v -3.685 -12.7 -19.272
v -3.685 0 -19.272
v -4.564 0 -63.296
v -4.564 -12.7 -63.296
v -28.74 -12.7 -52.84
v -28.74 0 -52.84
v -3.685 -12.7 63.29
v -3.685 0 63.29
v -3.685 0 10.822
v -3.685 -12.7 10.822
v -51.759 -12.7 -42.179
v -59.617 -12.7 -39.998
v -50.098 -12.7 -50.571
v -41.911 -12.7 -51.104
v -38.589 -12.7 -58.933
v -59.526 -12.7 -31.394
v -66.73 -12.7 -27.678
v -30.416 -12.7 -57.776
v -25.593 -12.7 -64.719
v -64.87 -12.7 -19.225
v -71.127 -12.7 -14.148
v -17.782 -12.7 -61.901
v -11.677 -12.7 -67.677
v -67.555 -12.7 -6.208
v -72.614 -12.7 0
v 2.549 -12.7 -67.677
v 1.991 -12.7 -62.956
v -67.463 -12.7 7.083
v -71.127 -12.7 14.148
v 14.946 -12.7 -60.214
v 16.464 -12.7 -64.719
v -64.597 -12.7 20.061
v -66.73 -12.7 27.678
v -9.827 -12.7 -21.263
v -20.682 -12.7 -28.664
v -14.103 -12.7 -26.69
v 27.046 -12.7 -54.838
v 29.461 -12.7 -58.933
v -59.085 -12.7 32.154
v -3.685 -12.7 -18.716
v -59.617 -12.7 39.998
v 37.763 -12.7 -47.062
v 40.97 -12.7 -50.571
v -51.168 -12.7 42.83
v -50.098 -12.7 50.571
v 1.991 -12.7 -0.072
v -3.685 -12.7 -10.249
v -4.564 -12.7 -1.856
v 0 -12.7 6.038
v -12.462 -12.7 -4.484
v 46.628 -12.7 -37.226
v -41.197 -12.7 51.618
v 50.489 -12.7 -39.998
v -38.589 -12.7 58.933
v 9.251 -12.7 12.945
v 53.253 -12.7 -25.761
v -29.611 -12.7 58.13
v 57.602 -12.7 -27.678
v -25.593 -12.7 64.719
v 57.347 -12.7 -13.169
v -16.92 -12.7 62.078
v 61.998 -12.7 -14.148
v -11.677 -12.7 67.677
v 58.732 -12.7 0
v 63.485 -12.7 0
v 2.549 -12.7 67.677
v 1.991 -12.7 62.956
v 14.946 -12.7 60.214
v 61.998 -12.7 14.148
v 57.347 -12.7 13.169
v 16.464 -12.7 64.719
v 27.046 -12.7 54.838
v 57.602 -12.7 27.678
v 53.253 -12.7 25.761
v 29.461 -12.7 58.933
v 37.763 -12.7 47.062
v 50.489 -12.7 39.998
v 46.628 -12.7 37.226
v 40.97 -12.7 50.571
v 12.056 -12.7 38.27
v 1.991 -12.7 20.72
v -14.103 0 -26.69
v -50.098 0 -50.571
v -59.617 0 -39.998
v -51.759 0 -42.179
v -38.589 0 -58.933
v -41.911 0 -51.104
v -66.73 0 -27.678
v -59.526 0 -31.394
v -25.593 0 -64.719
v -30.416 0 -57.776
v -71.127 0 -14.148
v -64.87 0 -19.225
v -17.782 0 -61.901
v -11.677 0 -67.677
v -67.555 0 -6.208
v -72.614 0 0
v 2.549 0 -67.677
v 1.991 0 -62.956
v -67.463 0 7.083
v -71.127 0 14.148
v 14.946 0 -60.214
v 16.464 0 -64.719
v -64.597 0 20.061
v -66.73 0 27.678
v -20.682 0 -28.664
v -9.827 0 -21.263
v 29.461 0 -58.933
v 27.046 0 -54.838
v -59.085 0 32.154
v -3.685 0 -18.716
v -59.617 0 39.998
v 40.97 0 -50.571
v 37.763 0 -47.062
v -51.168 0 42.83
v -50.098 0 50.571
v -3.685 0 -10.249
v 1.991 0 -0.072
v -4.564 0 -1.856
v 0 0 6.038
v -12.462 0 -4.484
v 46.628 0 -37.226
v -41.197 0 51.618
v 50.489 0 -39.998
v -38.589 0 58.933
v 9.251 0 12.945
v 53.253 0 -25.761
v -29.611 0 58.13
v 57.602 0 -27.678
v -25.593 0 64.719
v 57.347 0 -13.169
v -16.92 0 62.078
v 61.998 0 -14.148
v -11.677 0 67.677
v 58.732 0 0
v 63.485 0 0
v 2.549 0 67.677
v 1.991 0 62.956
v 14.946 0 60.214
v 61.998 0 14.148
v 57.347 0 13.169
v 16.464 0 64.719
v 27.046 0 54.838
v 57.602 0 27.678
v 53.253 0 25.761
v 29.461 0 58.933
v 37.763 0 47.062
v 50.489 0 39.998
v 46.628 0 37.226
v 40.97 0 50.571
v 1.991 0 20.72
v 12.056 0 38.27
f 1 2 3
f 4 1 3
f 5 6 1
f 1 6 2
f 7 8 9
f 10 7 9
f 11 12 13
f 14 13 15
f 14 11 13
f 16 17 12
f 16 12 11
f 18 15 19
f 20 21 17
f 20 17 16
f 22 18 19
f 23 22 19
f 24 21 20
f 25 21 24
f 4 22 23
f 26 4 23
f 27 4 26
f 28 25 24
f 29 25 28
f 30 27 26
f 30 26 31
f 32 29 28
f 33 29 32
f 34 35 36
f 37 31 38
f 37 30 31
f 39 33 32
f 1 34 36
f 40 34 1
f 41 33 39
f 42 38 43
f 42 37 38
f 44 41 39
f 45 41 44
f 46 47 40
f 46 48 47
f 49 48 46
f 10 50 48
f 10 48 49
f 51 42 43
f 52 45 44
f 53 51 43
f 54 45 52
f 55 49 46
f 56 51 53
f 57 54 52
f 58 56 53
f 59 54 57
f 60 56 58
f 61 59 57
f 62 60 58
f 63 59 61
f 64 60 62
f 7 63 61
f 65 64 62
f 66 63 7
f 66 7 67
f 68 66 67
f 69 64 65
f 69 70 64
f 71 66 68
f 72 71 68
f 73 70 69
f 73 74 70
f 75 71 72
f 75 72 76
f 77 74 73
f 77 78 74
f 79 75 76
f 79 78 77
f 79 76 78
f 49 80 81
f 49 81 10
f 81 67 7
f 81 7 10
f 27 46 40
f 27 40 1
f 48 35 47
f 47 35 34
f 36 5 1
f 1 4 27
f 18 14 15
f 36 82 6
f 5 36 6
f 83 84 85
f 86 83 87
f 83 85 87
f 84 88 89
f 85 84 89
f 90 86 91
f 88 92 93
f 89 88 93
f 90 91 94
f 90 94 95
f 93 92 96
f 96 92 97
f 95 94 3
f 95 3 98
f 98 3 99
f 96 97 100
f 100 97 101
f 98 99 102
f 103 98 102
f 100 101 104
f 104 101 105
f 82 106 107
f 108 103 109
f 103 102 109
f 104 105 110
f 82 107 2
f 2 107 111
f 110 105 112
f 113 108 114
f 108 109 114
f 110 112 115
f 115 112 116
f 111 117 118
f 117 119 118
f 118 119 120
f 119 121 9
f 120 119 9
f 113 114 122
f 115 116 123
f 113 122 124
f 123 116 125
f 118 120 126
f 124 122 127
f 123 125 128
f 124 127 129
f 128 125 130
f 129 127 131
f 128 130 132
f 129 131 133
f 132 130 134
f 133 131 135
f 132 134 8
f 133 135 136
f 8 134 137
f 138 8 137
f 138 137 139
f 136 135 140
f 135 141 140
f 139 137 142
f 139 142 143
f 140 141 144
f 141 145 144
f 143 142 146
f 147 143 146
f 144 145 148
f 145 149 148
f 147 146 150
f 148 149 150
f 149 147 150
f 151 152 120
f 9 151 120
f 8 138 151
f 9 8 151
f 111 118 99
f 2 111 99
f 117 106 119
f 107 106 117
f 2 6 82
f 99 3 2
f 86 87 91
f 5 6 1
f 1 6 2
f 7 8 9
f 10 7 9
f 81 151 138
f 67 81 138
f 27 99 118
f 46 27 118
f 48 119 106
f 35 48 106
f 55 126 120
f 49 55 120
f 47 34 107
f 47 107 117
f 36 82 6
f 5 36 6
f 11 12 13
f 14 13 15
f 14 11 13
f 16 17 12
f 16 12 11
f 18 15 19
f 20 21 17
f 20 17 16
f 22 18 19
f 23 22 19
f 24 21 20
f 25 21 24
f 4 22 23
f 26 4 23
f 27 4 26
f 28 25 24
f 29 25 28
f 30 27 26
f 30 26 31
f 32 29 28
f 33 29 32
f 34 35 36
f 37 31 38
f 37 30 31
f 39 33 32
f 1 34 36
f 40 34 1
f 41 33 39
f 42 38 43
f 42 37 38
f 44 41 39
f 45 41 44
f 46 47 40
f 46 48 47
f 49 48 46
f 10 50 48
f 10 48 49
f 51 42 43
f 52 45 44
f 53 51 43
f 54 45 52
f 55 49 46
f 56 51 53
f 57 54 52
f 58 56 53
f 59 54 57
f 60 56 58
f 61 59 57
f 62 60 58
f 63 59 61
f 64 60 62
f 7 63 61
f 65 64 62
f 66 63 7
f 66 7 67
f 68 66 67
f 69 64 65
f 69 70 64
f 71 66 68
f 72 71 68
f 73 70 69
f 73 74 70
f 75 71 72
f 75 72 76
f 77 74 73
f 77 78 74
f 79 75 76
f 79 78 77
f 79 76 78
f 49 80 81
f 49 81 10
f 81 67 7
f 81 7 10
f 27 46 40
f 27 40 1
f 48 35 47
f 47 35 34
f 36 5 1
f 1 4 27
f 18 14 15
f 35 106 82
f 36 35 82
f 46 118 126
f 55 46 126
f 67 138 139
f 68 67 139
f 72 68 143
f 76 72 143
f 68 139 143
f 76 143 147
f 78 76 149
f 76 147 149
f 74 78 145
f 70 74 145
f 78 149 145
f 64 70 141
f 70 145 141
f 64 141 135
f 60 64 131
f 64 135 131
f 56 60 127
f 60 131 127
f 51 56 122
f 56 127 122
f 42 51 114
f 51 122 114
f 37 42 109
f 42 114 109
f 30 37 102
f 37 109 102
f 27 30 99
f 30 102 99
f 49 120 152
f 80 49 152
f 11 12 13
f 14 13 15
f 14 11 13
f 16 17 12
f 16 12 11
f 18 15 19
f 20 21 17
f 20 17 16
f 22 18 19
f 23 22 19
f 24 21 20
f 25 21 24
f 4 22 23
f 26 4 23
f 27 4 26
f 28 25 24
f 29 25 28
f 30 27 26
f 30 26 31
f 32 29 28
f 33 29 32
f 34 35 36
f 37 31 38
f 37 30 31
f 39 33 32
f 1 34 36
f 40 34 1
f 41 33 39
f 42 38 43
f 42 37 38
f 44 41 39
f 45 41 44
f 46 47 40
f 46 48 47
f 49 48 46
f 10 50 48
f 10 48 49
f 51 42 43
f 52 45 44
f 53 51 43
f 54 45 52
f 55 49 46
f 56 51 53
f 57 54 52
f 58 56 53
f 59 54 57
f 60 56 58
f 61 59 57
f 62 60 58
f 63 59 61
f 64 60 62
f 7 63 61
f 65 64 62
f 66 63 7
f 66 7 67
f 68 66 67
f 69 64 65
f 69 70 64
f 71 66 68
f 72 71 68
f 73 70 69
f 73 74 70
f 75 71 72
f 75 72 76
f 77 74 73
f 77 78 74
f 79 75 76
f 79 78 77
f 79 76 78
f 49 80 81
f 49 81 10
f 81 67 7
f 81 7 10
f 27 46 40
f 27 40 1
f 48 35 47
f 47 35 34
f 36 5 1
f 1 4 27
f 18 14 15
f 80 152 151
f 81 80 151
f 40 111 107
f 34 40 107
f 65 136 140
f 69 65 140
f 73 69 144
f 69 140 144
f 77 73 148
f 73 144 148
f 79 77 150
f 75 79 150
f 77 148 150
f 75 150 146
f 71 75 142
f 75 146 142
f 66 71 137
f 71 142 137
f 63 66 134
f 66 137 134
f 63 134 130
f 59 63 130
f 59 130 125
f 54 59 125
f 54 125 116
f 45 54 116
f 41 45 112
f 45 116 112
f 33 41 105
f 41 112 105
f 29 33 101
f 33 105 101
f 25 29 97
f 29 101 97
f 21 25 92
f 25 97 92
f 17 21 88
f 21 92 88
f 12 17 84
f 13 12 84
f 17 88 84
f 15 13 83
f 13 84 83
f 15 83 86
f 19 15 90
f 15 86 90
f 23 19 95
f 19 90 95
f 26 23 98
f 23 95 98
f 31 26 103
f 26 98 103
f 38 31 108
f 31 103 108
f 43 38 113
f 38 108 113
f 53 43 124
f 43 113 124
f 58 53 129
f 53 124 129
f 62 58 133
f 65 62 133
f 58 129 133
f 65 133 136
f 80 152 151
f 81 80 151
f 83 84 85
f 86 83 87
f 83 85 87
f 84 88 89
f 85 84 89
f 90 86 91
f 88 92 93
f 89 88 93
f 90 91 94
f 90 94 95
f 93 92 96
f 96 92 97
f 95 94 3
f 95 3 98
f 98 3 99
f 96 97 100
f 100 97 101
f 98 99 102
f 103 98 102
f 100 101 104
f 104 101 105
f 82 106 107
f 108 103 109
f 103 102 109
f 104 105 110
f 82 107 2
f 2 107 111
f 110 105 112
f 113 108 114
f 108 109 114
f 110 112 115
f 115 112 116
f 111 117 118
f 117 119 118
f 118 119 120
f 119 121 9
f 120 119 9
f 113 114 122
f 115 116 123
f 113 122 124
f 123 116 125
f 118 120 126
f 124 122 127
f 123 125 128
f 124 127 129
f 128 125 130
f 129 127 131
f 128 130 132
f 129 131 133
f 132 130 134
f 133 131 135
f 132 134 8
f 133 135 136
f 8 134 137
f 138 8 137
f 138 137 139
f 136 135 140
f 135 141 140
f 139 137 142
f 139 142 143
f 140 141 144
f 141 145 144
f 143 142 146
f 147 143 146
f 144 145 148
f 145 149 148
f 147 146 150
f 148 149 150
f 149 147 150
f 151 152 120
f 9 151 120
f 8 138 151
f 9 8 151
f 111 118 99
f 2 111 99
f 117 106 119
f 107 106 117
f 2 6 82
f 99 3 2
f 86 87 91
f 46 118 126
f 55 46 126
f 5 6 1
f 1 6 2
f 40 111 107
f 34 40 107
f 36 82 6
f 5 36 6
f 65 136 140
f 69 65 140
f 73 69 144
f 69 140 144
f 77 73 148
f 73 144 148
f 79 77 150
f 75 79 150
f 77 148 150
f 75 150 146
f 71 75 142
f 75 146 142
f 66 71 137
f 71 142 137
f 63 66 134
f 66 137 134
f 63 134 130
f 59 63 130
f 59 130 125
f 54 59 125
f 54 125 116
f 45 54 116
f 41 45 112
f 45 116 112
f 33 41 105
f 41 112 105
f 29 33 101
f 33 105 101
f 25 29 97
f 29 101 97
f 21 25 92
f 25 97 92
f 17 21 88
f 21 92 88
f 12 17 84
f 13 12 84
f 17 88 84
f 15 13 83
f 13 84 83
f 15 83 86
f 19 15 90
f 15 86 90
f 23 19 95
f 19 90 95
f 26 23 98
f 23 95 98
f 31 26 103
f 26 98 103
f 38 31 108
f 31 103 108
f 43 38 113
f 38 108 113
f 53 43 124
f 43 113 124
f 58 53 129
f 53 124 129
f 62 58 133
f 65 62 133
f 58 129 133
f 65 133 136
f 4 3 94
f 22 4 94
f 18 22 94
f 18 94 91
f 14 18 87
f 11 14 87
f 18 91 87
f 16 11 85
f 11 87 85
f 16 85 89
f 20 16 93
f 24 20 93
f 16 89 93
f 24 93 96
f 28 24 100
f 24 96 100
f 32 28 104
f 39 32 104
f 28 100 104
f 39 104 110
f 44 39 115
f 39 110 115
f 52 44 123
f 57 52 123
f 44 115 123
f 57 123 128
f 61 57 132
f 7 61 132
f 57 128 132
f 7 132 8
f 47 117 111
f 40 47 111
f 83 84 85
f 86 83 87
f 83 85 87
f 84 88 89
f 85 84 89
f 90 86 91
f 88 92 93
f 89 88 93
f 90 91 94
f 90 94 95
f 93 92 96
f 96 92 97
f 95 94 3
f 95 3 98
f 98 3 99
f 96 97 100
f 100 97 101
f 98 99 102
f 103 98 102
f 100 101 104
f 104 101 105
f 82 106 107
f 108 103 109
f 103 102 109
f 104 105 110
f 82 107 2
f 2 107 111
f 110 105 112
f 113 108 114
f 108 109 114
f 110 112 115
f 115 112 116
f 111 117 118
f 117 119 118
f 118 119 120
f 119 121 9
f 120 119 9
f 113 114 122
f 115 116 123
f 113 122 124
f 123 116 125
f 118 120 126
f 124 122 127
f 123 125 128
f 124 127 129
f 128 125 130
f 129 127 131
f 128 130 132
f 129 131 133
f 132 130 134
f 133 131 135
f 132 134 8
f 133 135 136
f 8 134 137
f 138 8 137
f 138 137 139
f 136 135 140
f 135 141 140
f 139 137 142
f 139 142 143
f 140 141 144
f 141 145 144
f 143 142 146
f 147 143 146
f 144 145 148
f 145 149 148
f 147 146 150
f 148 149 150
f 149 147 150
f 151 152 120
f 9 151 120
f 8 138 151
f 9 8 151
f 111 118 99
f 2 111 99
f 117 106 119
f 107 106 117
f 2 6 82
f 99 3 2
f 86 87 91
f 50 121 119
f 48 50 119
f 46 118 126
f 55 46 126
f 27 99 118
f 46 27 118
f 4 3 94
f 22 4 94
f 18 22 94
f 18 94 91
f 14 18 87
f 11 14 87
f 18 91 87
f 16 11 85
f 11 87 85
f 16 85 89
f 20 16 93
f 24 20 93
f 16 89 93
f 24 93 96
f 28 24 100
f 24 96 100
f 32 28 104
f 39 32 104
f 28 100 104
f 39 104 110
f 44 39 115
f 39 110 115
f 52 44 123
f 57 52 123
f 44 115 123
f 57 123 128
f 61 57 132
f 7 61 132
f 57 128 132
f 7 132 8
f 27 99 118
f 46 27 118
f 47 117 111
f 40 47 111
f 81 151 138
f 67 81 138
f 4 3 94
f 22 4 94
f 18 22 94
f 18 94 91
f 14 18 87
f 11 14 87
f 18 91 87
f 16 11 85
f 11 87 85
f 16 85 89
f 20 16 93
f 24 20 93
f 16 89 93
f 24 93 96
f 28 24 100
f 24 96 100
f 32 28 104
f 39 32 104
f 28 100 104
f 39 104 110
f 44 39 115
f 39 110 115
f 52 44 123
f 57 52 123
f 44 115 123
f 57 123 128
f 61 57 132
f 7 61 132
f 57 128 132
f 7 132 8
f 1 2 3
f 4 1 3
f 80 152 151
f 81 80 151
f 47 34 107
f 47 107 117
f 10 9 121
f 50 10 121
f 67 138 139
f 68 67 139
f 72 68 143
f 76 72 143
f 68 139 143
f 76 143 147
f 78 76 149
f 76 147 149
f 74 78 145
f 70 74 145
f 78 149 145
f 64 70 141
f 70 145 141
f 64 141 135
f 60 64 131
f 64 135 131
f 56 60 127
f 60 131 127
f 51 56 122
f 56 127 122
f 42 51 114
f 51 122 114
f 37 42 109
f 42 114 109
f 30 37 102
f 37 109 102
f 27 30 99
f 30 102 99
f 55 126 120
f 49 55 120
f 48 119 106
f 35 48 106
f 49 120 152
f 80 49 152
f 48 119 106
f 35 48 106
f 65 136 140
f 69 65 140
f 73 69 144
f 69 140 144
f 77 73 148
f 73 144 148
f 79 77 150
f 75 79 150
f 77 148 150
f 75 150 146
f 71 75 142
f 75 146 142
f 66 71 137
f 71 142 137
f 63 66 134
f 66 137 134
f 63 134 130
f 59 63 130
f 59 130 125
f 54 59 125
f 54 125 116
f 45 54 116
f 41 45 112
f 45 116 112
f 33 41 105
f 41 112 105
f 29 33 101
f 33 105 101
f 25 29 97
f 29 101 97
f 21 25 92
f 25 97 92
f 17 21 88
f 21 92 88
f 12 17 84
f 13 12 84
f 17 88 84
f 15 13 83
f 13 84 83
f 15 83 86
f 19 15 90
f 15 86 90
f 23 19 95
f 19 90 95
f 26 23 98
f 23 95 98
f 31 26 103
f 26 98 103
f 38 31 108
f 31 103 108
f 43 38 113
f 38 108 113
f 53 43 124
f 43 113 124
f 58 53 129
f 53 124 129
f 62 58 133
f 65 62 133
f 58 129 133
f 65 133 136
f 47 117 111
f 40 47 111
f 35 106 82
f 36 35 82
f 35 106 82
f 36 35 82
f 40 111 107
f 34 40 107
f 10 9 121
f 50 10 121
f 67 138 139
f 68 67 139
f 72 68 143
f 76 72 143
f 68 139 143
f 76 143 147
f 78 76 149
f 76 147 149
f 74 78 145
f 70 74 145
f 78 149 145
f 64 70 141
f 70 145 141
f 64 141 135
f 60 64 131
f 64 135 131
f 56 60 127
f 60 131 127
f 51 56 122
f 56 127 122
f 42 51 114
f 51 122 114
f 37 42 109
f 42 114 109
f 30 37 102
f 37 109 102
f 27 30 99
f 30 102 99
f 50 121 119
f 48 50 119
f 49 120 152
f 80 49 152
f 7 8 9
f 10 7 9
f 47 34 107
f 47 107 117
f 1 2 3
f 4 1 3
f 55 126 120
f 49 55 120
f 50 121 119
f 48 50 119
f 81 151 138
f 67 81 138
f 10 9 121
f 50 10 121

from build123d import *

# Parameters (mm, degrees)
F0_R     = 68.049486
F1_DEPTH = 12.7
F2_DEPTH = 12.7
F3_DEPTH = 12.7


with BuildPart() as f1:
    # F0 (on Front) → F1 (new body)
    with BuildSketch(Plane.XZ):
        with Locations((-4.564174, 0)):
            Circle(F0_R)
        with BuildLine():
            Line((-3.684707, 10.822025), (-12.461956, -4.483647))
            Line((-12.461956, -4.483647), (-4.564174, -1.85643))
            Line((-4.564174, -1.85643), (-20.681644, -28.66406))
            Line((-20.681644, -28.66406), (-14.103085, -26.690492))
            Line((-14.103085, -26.690492), (-28.74038, -52.840266))
            Line((-28.74038, -52.840266), (-3.684707, -19.27209))
            Line((-3.684707, -19.27209), (-4.564174, -63.296126))
            ThreePointArc((-4.564174, -63.296126), (-67.858772, 0.439744), (-3.684707, 63.290016))
            Line((-3.684707, 63.290016), (-3.684707, 10.822025))
        make_face(mode=Mode.SUBTRACT)
        Polygon((-3.684707, -10.249377), (-3.684707, -18.716367), (-9.827021, -21.26318), align=None, mode=Mode.SUBTRACT)
        with BuildLine():
            Line((0, 6.037842), (12.05563, 38.269857))
            Line((12.05563, 38.269857), (1.991368, 20.719905))
            Line((1.991368, 20.719905), (1.991368, 62.955734))
            ThreePointArc((1.991368, 62.955734), (58.731952, 0), (1.991368, -62.955734))
            Line((1.991368, -62.955734), (1.991368, -0.071586))
            Line((1.991368, -0.071586), (9.250801, 12.945329))
            Line((9.250801, 12.945329), (0, 6.037842))
        make_face(mode=Mode.SUBTRACT)
    extrude(amount=F1_DEPTH)


with BuildPart() as f2:
    # F0 (on Front) → F2 (new body)
    with BuildSketch(Plane.XZ):
        with Locations((-4.564174, 0)):
            Circle(F0_R)
        with BuildLine():
            Line((-3.684707, 10.822025), (-12.461956, -4.483647))
            Line((-12.461956, -4.483647), (-4.564174, -1.85643))
            Line((-4.564174, -1.85643), (-20.681644, -28.66406))
            Line((-20.681644, -28.66406), (-14.103085, -26.690492))
            Line((-14.103085, -26.690492), (-28.74038, -52.840266))
            Line((-28.74038, -52.840266), (-3.684707, -19.27209))
            Line((-3.684707, -19.27209), (-4.564174, -63.296126))
            ThreePointArc((-4.564174, -63.296126), (-67.858772, 0.439744), (-3.684707, 63.290016))
            Line((-3.684707, 63.290016), (-3.684707, 10.822025))
        make_face(mode=Mode.SUBTRACT)
        Polygon((-3.684707, -10.249377), (-3.684707, -18.716367), (-9.827021, -21.26318), align=None, mode=Mode.SUBTRACT)
        with BuildLine():
            Line((0, 6.037842), (12.05563, 38.269857))
            Line((12.05563, 38.269857), (1.991368, 20.719905))
            Line((1.991368, 20.719905), (1.991368, 62.955734))
            ThreePointArc((1.991368, 62.955734), (58.731952, 0), (1.991368, -62.955734))
            Line((1.991368, -62.955734), (1.991368, -0.071586))
            Line((1.991368, -0.071586), (9.250801, 12.945329))
            Line((9.250801, 12.945329), (0, 6.037842))
        make_face(mode=Mode.SUBTRACT)
    extrude(amount=F2_DEPTH)


with BuildPart() as f3:
    # F0 (on Front) → F3 (new body)
    with BuildSketch(Plane.XZ):
        with Locations((-4.564174, 0)):
            Circle(F0_R)
        with BuildLine():
            Line((-3.684707, 10.822025), (-12.461956, -4.483647))
            Line((-12.461956, -4.483647), (-4.564174, -1.85643))
            Line((-4.564174, -1.85643), (-20.681644, -28.66406))
            Line((-20.681644, -28.66406), (-14.103085, -26.690492))
            Line((-14.103085, -26.690492), (-28.74038, -52.840266))
            Line((-28.74038, -52.840266), (-3.684707, -19.27209))
            Line((-3.684707, -19.27209), (-4.564174, -63.296126))
            ThreePointArc((-4.564174, -63.296126), (-67.858772, 0.439744), (-3.684707, 63.290016))
            Line((-3.684707, 63.290016), (-3.684707, 10.822025))
        make_face(mode=Mode.SUBTRACT)
        Polygon((-3.684707, -10.249377), (-3.684707, -18.716367), (-9.827021, -21.26318), align=None, mode=Mode.SUBTRACT)
        with BuildLine():
            Line((0, 6.037842), (12.05563, 38.269857))
            Line((12.05563, 38.269857), (1.991368, 20.719905))
            Line((1.991368, 20.719905), (1.991368, 62.955734))
            ThreePointArc((1.991368, 62.955734), (58.731952, 0), (1.991368, -62.955734))
            Line((1.991368, -62.955734), (1.991368, -0.071586))
            Line((1.991368, -0.071586), (9.250801, 12.945329))
            Line((9.250801, 12.945329), (0, 6.037842))
        make_face(mode=Mode.SUBTRACT)
    extrude(amount=F3_DEPTH)


solid = Compound([f1.part, f2.part, f3.part])
